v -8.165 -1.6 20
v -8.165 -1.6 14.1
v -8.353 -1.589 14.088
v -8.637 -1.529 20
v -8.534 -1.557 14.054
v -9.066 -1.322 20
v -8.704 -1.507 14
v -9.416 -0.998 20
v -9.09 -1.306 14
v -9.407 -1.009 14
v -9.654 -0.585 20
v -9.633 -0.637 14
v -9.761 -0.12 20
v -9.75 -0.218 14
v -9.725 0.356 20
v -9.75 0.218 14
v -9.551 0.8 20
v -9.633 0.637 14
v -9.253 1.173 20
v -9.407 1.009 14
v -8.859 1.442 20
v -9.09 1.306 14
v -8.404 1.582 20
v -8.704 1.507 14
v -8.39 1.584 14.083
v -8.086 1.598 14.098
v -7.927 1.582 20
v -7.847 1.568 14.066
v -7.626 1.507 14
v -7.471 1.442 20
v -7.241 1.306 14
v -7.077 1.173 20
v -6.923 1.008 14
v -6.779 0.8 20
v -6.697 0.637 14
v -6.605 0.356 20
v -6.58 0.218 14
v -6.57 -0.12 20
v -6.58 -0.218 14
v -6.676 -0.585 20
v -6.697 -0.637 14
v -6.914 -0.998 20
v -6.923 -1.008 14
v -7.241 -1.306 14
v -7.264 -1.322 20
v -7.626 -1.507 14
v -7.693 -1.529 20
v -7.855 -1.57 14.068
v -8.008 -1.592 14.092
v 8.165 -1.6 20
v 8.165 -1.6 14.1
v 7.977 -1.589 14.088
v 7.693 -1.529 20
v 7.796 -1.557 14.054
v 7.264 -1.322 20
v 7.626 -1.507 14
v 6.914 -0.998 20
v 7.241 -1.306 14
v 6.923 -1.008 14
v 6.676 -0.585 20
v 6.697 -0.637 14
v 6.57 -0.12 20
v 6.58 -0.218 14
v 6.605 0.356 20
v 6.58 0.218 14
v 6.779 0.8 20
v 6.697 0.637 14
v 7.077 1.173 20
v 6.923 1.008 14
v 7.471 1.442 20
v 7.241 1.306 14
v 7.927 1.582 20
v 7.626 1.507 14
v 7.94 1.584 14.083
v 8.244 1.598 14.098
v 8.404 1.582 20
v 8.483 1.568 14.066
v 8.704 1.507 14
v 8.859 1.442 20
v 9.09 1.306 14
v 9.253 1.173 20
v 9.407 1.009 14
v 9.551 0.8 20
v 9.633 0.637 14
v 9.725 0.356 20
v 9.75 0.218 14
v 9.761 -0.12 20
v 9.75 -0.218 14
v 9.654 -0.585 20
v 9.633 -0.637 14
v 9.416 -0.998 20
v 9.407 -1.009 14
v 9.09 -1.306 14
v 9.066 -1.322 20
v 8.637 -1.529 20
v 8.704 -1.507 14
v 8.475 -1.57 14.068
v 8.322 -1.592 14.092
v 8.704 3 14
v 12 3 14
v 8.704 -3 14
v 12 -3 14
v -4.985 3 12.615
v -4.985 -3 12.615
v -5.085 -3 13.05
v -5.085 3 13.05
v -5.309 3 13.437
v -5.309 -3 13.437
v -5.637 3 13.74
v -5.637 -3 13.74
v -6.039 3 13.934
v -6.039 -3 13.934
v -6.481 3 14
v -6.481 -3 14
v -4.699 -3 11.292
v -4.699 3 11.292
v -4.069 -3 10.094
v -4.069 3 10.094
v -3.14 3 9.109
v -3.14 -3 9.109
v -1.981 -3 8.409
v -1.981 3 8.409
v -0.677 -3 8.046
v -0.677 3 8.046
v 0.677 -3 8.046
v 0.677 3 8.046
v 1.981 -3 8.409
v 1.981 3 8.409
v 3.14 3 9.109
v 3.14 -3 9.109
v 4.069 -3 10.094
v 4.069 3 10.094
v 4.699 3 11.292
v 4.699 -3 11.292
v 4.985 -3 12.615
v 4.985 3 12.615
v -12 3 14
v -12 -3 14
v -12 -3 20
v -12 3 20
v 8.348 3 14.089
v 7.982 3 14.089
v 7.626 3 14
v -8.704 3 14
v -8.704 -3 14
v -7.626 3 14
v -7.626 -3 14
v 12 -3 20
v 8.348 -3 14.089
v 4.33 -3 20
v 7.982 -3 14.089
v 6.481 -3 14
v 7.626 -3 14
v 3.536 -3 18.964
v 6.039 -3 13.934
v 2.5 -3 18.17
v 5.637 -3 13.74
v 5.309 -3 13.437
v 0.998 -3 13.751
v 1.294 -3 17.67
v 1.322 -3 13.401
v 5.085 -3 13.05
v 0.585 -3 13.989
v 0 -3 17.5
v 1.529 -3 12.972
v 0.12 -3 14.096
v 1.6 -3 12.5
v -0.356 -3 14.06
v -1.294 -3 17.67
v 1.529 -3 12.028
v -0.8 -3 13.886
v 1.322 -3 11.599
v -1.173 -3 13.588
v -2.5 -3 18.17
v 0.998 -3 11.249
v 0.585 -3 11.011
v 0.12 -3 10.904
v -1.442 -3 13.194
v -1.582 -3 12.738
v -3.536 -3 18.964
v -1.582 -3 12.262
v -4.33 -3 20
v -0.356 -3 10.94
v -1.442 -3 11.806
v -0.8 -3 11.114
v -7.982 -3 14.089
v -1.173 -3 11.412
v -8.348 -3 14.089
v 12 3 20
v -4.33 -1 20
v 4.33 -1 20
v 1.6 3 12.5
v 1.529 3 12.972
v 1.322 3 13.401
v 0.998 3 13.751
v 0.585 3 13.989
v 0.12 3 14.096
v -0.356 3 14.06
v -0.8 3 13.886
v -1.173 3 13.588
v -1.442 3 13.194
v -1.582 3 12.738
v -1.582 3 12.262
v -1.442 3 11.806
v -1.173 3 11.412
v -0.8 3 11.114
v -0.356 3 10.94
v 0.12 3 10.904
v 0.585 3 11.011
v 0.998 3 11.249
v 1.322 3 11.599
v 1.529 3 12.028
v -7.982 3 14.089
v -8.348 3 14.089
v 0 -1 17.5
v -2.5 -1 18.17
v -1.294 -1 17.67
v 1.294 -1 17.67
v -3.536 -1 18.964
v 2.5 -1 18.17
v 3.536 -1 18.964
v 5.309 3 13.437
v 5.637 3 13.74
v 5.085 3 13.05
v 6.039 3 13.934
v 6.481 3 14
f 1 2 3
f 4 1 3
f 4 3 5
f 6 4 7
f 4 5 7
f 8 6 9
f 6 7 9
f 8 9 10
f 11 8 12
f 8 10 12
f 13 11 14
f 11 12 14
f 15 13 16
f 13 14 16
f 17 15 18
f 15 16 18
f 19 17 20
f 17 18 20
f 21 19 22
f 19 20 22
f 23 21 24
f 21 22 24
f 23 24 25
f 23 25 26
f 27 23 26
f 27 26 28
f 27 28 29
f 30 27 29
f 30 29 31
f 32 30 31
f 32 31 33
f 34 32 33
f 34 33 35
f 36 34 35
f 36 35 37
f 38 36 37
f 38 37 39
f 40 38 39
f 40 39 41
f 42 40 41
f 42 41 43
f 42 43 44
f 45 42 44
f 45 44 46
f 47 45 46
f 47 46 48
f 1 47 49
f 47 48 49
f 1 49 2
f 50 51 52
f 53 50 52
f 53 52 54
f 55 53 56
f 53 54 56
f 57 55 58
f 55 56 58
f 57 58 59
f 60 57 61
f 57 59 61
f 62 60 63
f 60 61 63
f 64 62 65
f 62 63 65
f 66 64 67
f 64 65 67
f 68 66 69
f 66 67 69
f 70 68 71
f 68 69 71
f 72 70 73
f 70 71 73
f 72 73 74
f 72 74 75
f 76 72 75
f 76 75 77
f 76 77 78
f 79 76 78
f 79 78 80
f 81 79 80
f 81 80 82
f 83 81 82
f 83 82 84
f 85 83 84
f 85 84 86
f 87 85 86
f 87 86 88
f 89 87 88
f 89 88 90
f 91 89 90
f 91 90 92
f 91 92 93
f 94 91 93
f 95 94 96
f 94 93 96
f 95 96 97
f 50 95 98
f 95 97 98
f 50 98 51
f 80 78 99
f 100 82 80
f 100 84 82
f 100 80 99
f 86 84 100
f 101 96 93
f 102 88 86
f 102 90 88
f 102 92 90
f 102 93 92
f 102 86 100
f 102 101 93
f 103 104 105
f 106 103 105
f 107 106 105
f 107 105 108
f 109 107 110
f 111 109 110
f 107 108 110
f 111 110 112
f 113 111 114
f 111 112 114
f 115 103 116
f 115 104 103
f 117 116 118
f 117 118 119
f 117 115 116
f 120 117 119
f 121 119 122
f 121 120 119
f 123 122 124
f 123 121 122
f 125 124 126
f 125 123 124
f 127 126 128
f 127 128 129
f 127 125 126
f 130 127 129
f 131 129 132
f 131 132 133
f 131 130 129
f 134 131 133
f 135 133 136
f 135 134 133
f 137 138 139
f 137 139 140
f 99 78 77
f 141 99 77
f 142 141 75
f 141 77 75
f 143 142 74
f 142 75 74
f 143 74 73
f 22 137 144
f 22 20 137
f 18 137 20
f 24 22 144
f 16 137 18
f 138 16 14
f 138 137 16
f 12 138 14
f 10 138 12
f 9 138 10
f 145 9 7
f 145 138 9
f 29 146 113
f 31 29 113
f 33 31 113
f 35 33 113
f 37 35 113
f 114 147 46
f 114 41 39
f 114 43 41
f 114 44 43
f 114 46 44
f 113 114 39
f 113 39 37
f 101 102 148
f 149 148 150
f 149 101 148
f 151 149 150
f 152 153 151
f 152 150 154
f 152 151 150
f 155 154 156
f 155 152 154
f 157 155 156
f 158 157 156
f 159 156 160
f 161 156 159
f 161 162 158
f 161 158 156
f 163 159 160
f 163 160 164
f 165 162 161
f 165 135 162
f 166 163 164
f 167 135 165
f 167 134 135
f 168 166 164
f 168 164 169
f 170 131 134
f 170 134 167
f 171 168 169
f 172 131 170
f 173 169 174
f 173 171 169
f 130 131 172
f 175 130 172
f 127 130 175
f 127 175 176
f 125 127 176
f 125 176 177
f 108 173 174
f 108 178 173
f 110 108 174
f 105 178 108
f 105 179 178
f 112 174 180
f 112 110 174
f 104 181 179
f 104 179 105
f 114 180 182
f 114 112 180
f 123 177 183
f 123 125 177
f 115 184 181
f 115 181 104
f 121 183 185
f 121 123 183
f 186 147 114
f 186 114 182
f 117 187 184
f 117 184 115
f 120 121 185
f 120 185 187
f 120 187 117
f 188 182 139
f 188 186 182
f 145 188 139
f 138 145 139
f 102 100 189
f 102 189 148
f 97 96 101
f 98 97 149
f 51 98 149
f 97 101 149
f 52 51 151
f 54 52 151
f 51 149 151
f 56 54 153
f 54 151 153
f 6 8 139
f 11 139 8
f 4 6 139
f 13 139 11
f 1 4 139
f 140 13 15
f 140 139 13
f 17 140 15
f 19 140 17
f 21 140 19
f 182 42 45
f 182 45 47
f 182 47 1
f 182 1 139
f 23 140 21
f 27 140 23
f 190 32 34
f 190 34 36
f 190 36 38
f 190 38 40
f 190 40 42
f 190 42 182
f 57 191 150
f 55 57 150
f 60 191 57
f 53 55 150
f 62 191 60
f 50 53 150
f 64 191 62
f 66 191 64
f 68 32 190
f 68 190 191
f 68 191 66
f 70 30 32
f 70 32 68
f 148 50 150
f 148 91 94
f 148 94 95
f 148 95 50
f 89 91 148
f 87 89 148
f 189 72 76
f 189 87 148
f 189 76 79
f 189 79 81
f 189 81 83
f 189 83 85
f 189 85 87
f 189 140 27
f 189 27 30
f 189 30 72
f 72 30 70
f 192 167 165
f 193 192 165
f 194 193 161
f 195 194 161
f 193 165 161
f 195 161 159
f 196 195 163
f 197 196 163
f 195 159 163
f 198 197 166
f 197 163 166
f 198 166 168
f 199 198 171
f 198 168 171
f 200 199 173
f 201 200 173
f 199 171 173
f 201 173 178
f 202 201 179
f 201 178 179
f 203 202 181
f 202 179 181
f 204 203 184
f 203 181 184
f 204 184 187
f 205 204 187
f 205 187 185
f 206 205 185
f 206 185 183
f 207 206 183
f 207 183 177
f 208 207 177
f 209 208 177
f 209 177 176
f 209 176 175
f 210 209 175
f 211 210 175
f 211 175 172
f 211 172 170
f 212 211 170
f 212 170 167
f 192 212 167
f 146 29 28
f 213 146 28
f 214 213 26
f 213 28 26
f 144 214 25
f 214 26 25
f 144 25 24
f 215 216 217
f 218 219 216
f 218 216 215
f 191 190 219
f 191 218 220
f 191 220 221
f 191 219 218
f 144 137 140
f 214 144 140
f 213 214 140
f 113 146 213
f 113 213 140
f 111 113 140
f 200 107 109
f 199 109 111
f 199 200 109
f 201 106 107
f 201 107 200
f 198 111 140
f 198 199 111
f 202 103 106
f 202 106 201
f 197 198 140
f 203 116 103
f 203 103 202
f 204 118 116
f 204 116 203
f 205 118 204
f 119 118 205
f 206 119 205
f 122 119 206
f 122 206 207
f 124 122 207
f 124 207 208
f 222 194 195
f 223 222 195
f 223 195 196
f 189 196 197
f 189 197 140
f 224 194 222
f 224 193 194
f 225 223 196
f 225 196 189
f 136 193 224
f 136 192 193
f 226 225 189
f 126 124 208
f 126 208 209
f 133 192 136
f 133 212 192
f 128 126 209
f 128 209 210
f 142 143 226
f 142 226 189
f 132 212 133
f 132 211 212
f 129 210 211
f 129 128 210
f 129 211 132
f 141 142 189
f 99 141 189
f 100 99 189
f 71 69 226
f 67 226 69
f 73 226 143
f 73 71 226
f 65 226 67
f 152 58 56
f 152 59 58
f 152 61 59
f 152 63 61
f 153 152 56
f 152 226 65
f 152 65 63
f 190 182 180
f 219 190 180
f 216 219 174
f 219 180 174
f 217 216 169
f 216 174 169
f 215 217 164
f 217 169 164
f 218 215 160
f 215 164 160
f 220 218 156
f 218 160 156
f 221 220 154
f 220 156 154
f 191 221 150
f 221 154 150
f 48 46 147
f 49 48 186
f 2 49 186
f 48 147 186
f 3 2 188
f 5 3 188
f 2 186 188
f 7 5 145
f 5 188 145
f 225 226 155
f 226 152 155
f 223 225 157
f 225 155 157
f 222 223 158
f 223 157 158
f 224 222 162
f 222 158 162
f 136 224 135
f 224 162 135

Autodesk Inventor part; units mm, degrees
ref_plane "YZ Plane" through (0, 0, 0) normal (1, 0, 0) x (0, 1, 0)
ref_plane "XZ Plane" through (0, 0, 0) normal (0, 1, 0) x (-1, 0, 0)
ref_plane "XY Plane" through (0, 0, 0) normal (0, 0, 1) x (1, 0, 0)
sketch "スケッチ1" plane through (0, 0, 0) normal (0, 0, 1) x (1, 0, 0)
  line L0 (12, -3) -> (-12, -3)
  line L1 (-12, -3) -> (-12, 3)
  line L2 (-12, 3) -> (12, 3)
  line L3 (12, 3) -> (12, -3)
  line L4 (12, -3) -> (-12, 3) construction
  line L5 (-12, -3) -> (12, 3) construction
  point P0 (0, 0)
  dimension "d0" = 24
  dimension "d1" = 6
extrude "押し出し1" add sketch "スケッチ1" along normal blind 20
sketch "スケッチ2" plane through (-12, -3, 0) normal (0, -1, 0) x (1, 0, 0)
  line L0 (23.1845, 35.5) -> (0.8155, 35.5) projected
  arc A0 (0.8155, 35.5) -> (-4.2691, 17.077) centre (12, 22.5) ccw projected
  arc A1 (-4.2691, 17.077) -> (0, 14) centre (0, 18.5) ccw projected
  line L1 (0, 14) -> (0, 17) projected
  arc A2 (0, 20) -> (0, 17) centre (0, 18.5) ccw projected
  line L2 (0, 20) -> (3.2964, 20) projected
  arc A3 (4.3735, 20) -> (3.2964, 20) centre (3.8349, 18.6) ccw projected
  line L3 (4.3735, 20) -> (7.6699, 20) projected
  arc A4 (16.3301, 20) -> (7.6699, 20) centre (12, 22.5) ccw projected
  line L4 (16.3301, 20) -> (19.6265, 20) projected
  arc A5 (20.7036, 20) -> (19.6265, 20) centre (20.1651, 18.6) ccw projected
  line L5 (20.7036, 20) -> (24, 20) projected
  arc A6 (24, 17) -> (24, 20) centre (24, 18.5) ccw projected
  line L6 (24, 17) -> (24, 14) projected
  arc A7 (24, 14) -> (28.2691, 17.077) centre (24, 18.5) ccw projected
  arc A8 (28.2691, 17.077) -> (23.1845, 35.5) centre (12, 22.5) ccw projected
  circle A9 centre (25, 24.5) radius 1.6 projected
  circle A10 centre (12, 32.5) radius 1.6 projected
  circle A11 centre (-1, 24.5) radius 1.6 projected
  line L7 (24, 0) -> (0, 0) projected
  line L8 (24, 0) -> (24, 14)
  line L9 (0, 20) -> (24, 20) projected
  circle A12 centre (12, 12.5) radius 1.6
  arc A13 (7.0148, 12.6154) -> (16.9852, 12.6154) centre (12, 13) ccw
  line L10 (3.8349, 18.6) -> (3.8349, 14) construction
  line L11 (20.1651, 18.6) -> (20.1651, 14) construction
  line L12 (0, 14) -> (5.5193, 14)
  line L13 (18.4807, 14) -> (24, 14)
  arc A14 (4.3735, 14) -> (3.2964, 14) centre (3.8349, 12.6) ccw
  arc A15 (20.7036, 14) -> (19.6265, 14) centre (20.1651, 12.6) ccw
  line L14 (5.3349, 18.6) -> (5.3349, 14) construction
  line L15 (18.6651, 18.6) -> (18.6651, 14) construction
  arc A16 (7.0148, 12.6154) -> (5.5193, 14) centre (5.5193, 12.5) ccw
  arc A17 (18.4807, 14) -> (16.9852, 12.6154) centre (18.4807, 12.5) ccw
  line L16 (0, 0) -> (0, 14)
  point P0 (12, 0)
  point P1 (7.101, 14)
  point P2 (16.899, 14)
  point P3 (12, 8)
  dimension "d5" = 3.2
  dimension "d6" = 10
  dimension "d7" = 4.5
  dimension "d8" = 5
  dimension "d11" = 3
  dimension "d12" = 3
  dimension "d13" = 1.4
  dimension "d14" = 1.5
  dimension "d15" = 1.5
  dimension "d16" = 1.5
extrude "押し出し2" cut sketch "スケッチ2" against normal through all contours L8 L7 L16 L12 A16 A13 A17 L13 | L13 A15 | A14 L12 | A12
sketch "スケッチ3" plane through (-12, -3, 20) normal (0, -1, 0) x (1, 0, 0)
  arc A0 (16.3301, 0) -> (7.6699, 0) centre (12, 2.5) ccw projected
  circle A1 centre (12, 2.5) radius 5
  point P0 (12, -20)
  dimension "d19" = 10
extrude "押し出し3" cut sketch "スケッチ3" against normal blind 2
sketch "スケッチ4" plane through (0, 0, 20) normal (0, 0, 1) x (1, 0, 0)
  circle A0 centre (8.1651, 0) radius 1.2295 projected
  circle A1 centre (-8.1651, 0) radius 1.2295 projected
  line L0 (-11.1845, 3) -> (11.1845, 3) projected
  line L1 (-11.1845, -3) -> (-11.1845, 3) projected
  line L2 (11.1845, -3) -> (-11.1845, -3) projected
  line L3 (11.1845, 3) -> (11.1845, -3) projected
  point P0 (0, 0)
hole "穴1" at (-8.1651, 0, 20) at (8.1651, 0, 20) direction (0, 0, -1) diameter 3.2 end through all
properties part number "DfixPit"
